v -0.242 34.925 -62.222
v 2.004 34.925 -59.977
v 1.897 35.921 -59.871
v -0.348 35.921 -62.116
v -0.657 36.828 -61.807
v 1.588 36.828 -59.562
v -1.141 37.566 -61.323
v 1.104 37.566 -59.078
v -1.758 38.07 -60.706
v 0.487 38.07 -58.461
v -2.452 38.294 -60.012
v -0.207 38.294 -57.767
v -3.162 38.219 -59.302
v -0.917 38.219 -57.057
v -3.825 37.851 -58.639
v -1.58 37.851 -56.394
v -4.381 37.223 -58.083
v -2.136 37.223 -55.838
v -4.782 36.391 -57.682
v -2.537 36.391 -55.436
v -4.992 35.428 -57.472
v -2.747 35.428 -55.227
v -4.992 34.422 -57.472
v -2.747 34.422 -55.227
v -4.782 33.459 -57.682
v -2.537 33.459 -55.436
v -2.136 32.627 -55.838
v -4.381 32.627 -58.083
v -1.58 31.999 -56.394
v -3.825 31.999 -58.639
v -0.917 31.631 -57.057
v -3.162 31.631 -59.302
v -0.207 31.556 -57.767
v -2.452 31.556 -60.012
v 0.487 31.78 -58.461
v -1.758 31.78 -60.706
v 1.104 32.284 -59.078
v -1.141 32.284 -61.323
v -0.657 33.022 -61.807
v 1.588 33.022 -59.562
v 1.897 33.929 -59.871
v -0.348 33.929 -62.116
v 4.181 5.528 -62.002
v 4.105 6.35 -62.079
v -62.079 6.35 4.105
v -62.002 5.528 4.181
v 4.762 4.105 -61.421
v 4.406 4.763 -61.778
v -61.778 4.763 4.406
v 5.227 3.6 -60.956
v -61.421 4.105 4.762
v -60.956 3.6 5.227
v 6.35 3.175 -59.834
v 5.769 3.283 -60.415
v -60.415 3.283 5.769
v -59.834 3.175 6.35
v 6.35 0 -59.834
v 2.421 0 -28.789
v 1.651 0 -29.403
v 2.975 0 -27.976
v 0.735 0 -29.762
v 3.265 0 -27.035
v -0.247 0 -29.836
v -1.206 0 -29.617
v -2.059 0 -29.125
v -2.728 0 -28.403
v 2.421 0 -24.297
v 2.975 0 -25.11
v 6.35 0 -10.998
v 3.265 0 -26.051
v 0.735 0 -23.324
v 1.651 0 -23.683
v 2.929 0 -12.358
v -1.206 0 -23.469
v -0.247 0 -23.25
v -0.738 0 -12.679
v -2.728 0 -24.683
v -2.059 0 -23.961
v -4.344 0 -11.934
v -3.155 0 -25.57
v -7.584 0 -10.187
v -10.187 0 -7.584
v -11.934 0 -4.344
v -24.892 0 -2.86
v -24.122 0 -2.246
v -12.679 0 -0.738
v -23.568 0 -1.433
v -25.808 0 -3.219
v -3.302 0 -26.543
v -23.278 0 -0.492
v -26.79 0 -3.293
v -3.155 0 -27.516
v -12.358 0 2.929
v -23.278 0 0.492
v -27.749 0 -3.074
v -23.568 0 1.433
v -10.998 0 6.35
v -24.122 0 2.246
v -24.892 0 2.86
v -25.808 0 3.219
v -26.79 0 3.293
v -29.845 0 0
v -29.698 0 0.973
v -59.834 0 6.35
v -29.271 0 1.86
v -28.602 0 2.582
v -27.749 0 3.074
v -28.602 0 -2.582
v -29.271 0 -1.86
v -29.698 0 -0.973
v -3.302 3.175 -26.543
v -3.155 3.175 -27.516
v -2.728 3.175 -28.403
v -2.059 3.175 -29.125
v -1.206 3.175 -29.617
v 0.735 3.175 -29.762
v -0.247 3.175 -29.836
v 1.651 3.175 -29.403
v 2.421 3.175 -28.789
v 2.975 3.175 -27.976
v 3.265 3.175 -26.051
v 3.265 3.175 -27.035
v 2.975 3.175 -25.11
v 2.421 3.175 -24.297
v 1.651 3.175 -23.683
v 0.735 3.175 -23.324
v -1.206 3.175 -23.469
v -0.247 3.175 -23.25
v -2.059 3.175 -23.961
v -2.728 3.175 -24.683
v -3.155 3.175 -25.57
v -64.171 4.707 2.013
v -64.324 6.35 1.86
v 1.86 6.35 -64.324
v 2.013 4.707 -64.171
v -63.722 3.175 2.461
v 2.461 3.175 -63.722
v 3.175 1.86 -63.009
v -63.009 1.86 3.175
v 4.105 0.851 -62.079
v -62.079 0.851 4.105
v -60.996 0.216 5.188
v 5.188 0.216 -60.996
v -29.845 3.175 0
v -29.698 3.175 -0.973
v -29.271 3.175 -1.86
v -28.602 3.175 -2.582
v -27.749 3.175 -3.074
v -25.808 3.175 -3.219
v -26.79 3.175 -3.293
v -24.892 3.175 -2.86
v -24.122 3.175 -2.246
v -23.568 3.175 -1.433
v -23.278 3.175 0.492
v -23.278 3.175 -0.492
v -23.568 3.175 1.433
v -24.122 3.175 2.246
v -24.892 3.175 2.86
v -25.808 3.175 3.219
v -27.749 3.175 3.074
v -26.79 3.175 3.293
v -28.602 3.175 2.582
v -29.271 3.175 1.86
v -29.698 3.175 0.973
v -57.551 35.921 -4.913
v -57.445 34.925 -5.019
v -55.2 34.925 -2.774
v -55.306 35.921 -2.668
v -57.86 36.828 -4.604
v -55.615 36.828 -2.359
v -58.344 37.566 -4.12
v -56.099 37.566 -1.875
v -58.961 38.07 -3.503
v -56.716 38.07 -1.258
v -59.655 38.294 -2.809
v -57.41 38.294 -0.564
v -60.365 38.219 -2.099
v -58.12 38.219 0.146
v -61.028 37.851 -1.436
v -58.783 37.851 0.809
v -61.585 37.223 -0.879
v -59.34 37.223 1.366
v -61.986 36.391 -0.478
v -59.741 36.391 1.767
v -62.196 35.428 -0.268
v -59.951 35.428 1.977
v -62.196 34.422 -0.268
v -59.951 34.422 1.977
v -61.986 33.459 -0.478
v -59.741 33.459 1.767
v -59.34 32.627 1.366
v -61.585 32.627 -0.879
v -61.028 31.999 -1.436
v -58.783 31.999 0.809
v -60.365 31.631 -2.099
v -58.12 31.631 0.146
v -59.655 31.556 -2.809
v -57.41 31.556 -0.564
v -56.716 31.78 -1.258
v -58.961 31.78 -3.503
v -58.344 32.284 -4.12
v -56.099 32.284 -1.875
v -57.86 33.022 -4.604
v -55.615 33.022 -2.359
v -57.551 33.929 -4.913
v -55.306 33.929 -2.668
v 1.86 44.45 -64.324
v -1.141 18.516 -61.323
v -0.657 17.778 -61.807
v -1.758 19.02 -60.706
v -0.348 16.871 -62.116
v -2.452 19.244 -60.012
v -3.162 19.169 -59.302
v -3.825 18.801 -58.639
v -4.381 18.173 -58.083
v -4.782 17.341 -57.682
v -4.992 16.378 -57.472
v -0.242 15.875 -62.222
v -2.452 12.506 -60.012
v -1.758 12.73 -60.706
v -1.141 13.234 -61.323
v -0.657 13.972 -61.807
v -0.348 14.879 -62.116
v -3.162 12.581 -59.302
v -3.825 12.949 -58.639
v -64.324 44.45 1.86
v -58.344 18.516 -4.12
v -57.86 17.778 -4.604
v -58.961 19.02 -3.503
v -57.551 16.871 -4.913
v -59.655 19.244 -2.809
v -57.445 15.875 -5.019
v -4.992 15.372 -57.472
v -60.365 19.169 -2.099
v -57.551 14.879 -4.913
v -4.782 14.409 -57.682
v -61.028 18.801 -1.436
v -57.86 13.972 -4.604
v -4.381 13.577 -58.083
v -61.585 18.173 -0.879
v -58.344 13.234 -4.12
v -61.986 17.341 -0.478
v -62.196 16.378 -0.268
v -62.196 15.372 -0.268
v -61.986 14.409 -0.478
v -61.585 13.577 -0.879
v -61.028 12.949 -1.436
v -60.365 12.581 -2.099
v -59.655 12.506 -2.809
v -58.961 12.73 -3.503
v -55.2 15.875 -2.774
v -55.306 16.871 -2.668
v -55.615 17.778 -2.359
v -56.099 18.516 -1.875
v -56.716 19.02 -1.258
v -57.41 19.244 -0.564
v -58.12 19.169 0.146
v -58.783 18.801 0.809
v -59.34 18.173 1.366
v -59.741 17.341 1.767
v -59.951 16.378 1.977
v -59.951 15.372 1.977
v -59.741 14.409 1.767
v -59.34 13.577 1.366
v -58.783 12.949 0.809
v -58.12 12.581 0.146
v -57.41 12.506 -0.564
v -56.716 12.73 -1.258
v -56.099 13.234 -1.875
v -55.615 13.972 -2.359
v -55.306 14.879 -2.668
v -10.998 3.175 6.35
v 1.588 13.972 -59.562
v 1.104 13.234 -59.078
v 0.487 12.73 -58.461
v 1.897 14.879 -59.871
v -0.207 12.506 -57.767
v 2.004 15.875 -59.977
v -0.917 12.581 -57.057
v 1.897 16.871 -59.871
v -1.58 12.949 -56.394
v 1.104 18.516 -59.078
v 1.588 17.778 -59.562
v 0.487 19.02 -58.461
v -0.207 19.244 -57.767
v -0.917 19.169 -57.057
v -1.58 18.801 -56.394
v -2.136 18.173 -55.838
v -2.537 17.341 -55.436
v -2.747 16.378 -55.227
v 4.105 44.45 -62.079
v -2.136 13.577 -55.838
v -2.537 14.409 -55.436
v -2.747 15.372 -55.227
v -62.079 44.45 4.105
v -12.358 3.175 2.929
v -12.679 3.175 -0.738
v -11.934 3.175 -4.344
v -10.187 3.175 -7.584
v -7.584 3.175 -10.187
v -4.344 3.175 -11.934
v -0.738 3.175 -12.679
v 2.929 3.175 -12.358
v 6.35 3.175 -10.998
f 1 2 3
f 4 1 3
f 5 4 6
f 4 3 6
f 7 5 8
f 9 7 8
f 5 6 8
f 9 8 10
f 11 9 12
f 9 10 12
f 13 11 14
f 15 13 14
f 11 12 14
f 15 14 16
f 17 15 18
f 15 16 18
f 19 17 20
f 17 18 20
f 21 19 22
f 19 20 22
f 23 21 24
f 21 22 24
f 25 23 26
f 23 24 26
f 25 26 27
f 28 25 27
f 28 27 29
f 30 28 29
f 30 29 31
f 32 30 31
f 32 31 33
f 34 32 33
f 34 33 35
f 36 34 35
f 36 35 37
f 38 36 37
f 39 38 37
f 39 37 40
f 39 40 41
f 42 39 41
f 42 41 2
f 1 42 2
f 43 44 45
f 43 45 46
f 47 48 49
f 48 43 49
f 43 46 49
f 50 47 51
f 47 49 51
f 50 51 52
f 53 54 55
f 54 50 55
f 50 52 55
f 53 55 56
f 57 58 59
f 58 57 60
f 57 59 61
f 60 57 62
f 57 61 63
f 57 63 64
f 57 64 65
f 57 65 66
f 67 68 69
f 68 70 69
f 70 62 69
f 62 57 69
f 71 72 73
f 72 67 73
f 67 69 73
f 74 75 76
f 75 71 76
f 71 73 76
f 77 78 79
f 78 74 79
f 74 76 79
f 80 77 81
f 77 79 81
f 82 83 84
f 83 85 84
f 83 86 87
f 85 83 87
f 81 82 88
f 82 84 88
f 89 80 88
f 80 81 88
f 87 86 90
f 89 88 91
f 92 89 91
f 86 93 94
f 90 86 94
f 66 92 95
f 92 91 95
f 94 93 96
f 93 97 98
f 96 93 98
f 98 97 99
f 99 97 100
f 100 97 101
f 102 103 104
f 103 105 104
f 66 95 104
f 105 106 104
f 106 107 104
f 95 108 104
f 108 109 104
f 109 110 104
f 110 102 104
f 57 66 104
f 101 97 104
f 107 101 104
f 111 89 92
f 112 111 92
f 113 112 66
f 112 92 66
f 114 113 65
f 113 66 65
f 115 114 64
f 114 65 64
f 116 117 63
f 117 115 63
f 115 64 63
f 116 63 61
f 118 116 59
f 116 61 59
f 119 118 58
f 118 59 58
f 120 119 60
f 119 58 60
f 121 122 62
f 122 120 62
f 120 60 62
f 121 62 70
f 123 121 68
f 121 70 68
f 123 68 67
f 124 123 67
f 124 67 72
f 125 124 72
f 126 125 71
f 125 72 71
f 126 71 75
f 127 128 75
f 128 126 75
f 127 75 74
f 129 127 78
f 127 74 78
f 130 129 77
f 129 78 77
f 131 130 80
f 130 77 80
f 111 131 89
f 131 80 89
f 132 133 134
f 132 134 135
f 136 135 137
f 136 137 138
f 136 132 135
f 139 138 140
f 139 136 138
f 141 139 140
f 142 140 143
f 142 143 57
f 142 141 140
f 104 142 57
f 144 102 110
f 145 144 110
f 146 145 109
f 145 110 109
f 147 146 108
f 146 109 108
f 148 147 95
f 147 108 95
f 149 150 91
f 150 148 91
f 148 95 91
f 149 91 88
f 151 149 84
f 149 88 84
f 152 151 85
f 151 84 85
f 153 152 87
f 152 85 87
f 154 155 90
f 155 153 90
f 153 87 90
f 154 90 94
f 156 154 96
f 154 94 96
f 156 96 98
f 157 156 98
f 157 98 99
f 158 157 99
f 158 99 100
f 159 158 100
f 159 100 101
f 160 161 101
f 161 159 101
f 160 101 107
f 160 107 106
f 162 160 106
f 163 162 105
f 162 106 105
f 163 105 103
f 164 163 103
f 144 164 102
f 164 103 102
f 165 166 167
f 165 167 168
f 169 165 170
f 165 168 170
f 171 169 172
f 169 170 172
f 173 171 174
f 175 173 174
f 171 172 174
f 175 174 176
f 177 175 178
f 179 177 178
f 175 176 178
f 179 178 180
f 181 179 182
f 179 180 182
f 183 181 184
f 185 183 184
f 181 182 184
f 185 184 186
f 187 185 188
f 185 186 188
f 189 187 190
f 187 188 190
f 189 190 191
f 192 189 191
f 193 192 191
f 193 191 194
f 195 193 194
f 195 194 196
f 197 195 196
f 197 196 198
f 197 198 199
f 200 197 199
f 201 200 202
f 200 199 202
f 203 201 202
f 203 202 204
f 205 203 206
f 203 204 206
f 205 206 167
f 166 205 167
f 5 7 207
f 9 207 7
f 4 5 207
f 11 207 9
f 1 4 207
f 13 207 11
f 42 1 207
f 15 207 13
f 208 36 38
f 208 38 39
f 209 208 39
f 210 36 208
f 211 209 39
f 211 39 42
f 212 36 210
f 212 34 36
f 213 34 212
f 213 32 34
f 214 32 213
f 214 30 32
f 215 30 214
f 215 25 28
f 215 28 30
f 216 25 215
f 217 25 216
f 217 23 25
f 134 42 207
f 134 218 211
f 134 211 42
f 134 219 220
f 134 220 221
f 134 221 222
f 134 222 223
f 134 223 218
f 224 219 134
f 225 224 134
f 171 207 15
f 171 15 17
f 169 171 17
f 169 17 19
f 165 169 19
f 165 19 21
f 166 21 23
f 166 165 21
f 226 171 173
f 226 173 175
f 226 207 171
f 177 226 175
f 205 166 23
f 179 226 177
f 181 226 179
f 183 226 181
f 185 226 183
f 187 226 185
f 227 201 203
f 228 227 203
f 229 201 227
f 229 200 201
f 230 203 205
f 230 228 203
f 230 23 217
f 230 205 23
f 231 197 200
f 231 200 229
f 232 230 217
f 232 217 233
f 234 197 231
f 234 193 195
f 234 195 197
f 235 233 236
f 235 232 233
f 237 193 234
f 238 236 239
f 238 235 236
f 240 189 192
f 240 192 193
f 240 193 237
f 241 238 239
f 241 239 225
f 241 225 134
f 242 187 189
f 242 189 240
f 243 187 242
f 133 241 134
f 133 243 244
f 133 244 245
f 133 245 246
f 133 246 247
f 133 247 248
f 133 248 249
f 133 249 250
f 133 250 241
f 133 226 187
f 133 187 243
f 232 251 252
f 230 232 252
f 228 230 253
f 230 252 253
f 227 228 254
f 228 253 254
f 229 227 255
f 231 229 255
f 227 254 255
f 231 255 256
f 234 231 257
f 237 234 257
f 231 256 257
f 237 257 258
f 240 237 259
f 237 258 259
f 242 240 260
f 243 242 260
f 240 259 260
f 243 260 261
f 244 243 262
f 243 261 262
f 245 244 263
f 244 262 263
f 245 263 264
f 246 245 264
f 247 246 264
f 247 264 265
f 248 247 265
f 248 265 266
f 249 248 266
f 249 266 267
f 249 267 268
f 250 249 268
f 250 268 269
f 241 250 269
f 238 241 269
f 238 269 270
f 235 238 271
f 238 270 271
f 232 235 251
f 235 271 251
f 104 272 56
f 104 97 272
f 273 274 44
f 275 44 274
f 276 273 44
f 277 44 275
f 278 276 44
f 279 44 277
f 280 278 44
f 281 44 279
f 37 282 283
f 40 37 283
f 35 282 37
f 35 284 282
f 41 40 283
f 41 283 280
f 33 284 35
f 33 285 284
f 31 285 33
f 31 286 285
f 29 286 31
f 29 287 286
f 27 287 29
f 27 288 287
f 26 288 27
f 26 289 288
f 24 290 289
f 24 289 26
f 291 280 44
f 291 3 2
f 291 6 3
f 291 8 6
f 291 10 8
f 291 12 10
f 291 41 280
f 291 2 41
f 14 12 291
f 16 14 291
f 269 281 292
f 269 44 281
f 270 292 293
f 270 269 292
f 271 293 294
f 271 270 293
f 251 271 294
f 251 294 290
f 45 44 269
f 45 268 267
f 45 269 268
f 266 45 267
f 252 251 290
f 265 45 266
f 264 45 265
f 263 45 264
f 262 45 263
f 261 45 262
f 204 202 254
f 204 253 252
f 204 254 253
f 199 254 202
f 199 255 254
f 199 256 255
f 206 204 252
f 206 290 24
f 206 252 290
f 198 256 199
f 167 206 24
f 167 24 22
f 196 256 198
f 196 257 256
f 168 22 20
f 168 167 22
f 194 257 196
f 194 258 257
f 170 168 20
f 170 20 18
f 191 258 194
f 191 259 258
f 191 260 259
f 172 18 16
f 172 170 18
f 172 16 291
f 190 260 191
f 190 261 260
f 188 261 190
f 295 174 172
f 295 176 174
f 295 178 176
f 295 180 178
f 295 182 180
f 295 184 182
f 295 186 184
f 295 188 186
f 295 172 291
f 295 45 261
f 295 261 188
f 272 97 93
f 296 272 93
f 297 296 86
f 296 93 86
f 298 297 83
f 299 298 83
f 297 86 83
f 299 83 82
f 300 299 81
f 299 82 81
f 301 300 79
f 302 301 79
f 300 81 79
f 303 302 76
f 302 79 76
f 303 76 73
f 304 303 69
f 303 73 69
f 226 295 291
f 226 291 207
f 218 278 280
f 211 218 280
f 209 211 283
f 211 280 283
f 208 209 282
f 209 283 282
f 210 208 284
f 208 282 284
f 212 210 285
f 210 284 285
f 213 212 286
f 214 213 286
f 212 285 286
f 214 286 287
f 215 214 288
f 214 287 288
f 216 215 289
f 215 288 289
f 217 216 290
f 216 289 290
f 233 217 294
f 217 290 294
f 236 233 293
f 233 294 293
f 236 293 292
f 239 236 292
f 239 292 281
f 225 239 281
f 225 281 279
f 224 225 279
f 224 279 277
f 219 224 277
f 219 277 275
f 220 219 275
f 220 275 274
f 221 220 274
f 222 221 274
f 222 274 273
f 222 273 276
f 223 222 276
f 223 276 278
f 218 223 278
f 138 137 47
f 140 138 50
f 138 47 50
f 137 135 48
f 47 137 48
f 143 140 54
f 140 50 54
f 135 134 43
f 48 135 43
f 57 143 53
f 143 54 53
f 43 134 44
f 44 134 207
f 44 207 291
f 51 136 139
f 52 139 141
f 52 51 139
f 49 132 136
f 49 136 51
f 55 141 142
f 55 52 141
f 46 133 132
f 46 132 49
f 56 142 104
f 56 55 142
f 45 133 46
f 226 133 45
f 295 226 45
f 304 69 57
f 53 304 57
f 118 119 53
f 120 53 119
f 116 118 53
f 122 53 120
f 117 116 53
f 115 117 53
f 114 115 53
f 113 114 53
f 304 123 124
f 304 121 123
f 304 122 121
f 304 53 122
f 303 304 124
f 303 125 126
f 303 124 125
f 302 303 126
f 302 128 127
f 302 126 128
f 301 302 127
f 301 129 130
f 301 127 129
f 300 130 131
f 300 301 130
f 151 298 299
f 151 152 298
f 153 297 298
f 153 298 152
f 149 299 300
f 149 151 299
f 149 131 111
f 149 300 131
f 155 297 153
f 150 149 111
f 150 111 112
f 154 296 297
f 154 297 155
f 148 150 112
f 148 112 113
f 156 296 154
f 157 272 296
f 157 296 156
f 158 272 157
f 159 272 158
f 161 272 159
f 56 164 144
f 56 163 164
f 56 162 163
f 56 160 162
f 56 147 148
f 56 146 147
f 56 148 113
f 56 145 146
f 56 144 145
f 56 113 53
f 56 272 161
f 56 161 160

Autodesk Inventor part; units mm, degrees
ref_plane "YZ Plane" through (0, 0, 0) normal (1, 0, 0) x (0, 1, 0)
ref_plane "XZ Plane" through (0, 0, 0) normal (0, 1, 0) x (-1, 0, 0)
ref_plane "XY Plane" through (0, 0, 0) normal (0, 0, 1) x (1, 0, 0)
sketch "Sketch1" plane through (0, 0, 0) normal (0, 1, 0) x (-1, 0, 0)
  circle A0 centre (0, 0) radius 26.543 construction
  circle A1 centre (0, 26.543) radius 3.302
  circle A2 centre (26.543, 0) radius 3.302
  circle A3 centre (0, -26.543) radius 3.302
  circle A4 centre (-26.543, 0) radius 3.302
  circle A5 centre (0, 0) radius 12.7
  line L0 (0, 0) -> (-8.4134, 0) construction
  line L1 (10.9985, 6.35) -> (59.8338, 6.35)
  line L2 (-6.35, -10.9985) -> (-6.35, -59.8338)
  line L3 (59.8338, 6.35) -> (-6.35, -59.8338)
  dimension "d0" = 53.086
  dimension "d1" = 6.604
  dimension "d2" = 6.604
  dimension "d3" = 6.604
  dimension "d4" = 6.604
  dimension "d5" = 25.4
  dimension "d8" = 6.35
  dimension "d9" = 0
  dimension "d10" = 6.35
  dimension "d11" = 6.35
  dimension "d12" = 45
  dimension "d13" = 19.05
extrude "Plate1" add sketch "Sketch1" along normal blind 3.175 contours A5 L1 L3 L2
sketch "Sketch2" plane through (-62.0788, 6.35, 4.1049) normal (-0.7071068, 0, -0.7071068) x (0, -1, 0)
  line L0 (0, -93.598) -> (0, 0)
  line L1 (0, 0) -> (-38.1, 0)
  line L2 (-38.1, 0) -> (-38.1, -93.598)
  line L3 (-38.1, -93.598) -> (0, -93.598)
edge flange "Flange1" height 44.45 angle 90 thickness 3.175 bend radius 3.175 thickness toward (-0.7071068, 0, -0.7071068) relief tear relief width 3.175 relief depth 1.5875 edges at (-26.7419, 3.175, -26.7419) wall of the first edge with corners at (4.1049, 6.35, -62.0788) (-62.0788, 6.35, 4.1049) (-62.0788, 44.45, 4.1049) (4.1049, 44.45, -62.0788)
bend "Bend1"
corner "Corner1"
sketch "Sketch3" plane through (4.1049, 6.35, -62.0788) normal (0.7071068, 0, 0.7071068) x (0.7071068, 0, -0.7071068)
  line L0 (0, 38.1) -> (-93.598, 38.1) projected
  line L1 (0, 38.1) -> (0, 0) projected
  line L2 (-93.598, 38.1) -> (-93.598, 0) projected
  line L3 (-93.598, 0) -> (0, 0) projected
  circle A0 centre (-87.248, 28.575) radius 3.3782
  circle A1 centre (-6.35, 28.575) radius 3.3782
  circle A2 centre (-6.35, 9.525) radius 3.3782
  circle A3 centre (-87.248, 9.525) radius 3.3782
  point P0 (-46.799, -6.35)
  dimension "d35" = 93.598
  dimension "d36" = 6.7564
  dimension "d37" = 6.7564
  dimension "d38" = 6.7564
  dimension "d39" = 6.7564
  dimension "d40" = 6.35
  dimension "d41" = 9.525
  dimension "d42" = 9.525
  dimension "d43" = 6.35
  dimension "d44" = 9.525
  dimension "d45" = 9.525
  dimension "d47" = 6.35
  dimension "d48" = 6.35
extrude "Cut3" cut sketch "Sketch3" against normal blind 3.175 contours A0 | A1 | A2 | A3
equation "\"d49\" = Thickness"
equation "\"d15\" = BendReliefWidth"
equation "\"d16\" = BendReliefDepth"
equation "\"d17\" = MinimumRemnant"
equation "\"d18\" = BendRadius"
equation "\"d21\" = BendRadius"
equation "\"d22\" = CornerReliefSize"
equation "\"d23\" = GapSize"
equation "\"d24\" = JacobiRadiusSize"
equation "\"BendRadius\" = Thickness"
equation "\"BendReliefWidth\" = Thickness"
equation "\"BendReliefDepth\" = 0.5 * Thickness"
equation "\"CornerReliefSize\" = 4 * Thickness"
equation "\"MinimumRemnant\" = 2 * Thickness"
equation "\"TransitionRadius\" = BendRadius"
equation "\"JacobiRadiusSize\" = BendRadius"
equation "\"GapSize\" = Thickness"
equation "\"d14\" = BendRadius"
equation "\"Thickness\" = 3.175"
properties part number "Bearing Mount 3 v1" material "Aluminum 6061"
